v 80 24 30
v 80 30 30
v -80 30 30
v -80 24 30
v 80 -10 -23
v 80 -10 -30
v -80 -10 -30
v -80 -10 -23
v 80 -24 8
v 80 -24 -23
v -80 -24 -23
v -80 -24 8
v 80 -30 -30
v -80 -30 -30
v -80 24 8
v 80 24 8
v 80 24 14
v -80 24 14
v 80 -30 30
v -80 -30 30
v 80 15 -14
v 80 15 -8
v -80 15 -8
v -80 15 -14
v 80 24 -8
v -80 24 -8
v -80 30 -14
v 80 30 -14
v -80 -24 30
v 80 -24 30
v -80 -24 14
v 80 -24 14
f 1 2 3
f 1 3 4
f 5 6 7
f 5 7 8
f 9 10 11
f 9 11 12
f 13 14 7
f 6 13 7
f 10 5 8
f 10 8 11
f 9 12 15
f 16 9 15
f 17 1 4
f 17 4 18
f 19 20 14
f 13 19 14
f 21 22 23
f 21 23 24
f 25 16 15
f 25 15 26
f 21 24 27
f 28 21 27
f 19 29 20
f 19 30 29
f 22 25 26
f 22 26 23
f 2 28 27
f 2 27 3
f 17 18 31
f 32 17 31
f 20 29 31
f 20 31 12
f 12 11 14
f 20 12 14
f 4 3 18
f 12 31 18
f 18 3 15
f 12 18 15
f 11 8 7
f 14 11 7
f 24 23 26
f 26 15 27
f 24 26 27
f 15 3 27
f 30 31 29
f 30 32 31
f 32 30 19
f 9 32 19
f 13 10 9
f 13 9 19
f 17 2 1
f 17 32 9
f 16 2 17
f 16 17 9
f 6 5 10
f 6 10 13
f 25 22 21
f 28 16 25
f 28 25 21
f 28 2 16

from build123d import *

# Parameters (mm, degrees)
EXTRUDE_1_DEPTH = 80


with BuildPart() as part:
    # Эскиз1 → Бобышка-Вытянуть1 (new, symmetric)
    with BuildSketch(Plane(origin=(0, 0, 0), x_dir=(0, 0, -1), z_dir=(1, 0, 0))):
        Polygon((-30, -24), (-30, -30), (30, -30), (30, -10), (23, -10), (23, -24), (8, -24), (-8, -24), (-8, 24), (8, 24), (8, 15), (14, 15), (14, 30), (-30, 30), (-30, 24), (-14, 24), (-14, -24), align=None)
    extrude(amount=EXTRUDE_1_DEPTH, both=True)


solid = part.part
